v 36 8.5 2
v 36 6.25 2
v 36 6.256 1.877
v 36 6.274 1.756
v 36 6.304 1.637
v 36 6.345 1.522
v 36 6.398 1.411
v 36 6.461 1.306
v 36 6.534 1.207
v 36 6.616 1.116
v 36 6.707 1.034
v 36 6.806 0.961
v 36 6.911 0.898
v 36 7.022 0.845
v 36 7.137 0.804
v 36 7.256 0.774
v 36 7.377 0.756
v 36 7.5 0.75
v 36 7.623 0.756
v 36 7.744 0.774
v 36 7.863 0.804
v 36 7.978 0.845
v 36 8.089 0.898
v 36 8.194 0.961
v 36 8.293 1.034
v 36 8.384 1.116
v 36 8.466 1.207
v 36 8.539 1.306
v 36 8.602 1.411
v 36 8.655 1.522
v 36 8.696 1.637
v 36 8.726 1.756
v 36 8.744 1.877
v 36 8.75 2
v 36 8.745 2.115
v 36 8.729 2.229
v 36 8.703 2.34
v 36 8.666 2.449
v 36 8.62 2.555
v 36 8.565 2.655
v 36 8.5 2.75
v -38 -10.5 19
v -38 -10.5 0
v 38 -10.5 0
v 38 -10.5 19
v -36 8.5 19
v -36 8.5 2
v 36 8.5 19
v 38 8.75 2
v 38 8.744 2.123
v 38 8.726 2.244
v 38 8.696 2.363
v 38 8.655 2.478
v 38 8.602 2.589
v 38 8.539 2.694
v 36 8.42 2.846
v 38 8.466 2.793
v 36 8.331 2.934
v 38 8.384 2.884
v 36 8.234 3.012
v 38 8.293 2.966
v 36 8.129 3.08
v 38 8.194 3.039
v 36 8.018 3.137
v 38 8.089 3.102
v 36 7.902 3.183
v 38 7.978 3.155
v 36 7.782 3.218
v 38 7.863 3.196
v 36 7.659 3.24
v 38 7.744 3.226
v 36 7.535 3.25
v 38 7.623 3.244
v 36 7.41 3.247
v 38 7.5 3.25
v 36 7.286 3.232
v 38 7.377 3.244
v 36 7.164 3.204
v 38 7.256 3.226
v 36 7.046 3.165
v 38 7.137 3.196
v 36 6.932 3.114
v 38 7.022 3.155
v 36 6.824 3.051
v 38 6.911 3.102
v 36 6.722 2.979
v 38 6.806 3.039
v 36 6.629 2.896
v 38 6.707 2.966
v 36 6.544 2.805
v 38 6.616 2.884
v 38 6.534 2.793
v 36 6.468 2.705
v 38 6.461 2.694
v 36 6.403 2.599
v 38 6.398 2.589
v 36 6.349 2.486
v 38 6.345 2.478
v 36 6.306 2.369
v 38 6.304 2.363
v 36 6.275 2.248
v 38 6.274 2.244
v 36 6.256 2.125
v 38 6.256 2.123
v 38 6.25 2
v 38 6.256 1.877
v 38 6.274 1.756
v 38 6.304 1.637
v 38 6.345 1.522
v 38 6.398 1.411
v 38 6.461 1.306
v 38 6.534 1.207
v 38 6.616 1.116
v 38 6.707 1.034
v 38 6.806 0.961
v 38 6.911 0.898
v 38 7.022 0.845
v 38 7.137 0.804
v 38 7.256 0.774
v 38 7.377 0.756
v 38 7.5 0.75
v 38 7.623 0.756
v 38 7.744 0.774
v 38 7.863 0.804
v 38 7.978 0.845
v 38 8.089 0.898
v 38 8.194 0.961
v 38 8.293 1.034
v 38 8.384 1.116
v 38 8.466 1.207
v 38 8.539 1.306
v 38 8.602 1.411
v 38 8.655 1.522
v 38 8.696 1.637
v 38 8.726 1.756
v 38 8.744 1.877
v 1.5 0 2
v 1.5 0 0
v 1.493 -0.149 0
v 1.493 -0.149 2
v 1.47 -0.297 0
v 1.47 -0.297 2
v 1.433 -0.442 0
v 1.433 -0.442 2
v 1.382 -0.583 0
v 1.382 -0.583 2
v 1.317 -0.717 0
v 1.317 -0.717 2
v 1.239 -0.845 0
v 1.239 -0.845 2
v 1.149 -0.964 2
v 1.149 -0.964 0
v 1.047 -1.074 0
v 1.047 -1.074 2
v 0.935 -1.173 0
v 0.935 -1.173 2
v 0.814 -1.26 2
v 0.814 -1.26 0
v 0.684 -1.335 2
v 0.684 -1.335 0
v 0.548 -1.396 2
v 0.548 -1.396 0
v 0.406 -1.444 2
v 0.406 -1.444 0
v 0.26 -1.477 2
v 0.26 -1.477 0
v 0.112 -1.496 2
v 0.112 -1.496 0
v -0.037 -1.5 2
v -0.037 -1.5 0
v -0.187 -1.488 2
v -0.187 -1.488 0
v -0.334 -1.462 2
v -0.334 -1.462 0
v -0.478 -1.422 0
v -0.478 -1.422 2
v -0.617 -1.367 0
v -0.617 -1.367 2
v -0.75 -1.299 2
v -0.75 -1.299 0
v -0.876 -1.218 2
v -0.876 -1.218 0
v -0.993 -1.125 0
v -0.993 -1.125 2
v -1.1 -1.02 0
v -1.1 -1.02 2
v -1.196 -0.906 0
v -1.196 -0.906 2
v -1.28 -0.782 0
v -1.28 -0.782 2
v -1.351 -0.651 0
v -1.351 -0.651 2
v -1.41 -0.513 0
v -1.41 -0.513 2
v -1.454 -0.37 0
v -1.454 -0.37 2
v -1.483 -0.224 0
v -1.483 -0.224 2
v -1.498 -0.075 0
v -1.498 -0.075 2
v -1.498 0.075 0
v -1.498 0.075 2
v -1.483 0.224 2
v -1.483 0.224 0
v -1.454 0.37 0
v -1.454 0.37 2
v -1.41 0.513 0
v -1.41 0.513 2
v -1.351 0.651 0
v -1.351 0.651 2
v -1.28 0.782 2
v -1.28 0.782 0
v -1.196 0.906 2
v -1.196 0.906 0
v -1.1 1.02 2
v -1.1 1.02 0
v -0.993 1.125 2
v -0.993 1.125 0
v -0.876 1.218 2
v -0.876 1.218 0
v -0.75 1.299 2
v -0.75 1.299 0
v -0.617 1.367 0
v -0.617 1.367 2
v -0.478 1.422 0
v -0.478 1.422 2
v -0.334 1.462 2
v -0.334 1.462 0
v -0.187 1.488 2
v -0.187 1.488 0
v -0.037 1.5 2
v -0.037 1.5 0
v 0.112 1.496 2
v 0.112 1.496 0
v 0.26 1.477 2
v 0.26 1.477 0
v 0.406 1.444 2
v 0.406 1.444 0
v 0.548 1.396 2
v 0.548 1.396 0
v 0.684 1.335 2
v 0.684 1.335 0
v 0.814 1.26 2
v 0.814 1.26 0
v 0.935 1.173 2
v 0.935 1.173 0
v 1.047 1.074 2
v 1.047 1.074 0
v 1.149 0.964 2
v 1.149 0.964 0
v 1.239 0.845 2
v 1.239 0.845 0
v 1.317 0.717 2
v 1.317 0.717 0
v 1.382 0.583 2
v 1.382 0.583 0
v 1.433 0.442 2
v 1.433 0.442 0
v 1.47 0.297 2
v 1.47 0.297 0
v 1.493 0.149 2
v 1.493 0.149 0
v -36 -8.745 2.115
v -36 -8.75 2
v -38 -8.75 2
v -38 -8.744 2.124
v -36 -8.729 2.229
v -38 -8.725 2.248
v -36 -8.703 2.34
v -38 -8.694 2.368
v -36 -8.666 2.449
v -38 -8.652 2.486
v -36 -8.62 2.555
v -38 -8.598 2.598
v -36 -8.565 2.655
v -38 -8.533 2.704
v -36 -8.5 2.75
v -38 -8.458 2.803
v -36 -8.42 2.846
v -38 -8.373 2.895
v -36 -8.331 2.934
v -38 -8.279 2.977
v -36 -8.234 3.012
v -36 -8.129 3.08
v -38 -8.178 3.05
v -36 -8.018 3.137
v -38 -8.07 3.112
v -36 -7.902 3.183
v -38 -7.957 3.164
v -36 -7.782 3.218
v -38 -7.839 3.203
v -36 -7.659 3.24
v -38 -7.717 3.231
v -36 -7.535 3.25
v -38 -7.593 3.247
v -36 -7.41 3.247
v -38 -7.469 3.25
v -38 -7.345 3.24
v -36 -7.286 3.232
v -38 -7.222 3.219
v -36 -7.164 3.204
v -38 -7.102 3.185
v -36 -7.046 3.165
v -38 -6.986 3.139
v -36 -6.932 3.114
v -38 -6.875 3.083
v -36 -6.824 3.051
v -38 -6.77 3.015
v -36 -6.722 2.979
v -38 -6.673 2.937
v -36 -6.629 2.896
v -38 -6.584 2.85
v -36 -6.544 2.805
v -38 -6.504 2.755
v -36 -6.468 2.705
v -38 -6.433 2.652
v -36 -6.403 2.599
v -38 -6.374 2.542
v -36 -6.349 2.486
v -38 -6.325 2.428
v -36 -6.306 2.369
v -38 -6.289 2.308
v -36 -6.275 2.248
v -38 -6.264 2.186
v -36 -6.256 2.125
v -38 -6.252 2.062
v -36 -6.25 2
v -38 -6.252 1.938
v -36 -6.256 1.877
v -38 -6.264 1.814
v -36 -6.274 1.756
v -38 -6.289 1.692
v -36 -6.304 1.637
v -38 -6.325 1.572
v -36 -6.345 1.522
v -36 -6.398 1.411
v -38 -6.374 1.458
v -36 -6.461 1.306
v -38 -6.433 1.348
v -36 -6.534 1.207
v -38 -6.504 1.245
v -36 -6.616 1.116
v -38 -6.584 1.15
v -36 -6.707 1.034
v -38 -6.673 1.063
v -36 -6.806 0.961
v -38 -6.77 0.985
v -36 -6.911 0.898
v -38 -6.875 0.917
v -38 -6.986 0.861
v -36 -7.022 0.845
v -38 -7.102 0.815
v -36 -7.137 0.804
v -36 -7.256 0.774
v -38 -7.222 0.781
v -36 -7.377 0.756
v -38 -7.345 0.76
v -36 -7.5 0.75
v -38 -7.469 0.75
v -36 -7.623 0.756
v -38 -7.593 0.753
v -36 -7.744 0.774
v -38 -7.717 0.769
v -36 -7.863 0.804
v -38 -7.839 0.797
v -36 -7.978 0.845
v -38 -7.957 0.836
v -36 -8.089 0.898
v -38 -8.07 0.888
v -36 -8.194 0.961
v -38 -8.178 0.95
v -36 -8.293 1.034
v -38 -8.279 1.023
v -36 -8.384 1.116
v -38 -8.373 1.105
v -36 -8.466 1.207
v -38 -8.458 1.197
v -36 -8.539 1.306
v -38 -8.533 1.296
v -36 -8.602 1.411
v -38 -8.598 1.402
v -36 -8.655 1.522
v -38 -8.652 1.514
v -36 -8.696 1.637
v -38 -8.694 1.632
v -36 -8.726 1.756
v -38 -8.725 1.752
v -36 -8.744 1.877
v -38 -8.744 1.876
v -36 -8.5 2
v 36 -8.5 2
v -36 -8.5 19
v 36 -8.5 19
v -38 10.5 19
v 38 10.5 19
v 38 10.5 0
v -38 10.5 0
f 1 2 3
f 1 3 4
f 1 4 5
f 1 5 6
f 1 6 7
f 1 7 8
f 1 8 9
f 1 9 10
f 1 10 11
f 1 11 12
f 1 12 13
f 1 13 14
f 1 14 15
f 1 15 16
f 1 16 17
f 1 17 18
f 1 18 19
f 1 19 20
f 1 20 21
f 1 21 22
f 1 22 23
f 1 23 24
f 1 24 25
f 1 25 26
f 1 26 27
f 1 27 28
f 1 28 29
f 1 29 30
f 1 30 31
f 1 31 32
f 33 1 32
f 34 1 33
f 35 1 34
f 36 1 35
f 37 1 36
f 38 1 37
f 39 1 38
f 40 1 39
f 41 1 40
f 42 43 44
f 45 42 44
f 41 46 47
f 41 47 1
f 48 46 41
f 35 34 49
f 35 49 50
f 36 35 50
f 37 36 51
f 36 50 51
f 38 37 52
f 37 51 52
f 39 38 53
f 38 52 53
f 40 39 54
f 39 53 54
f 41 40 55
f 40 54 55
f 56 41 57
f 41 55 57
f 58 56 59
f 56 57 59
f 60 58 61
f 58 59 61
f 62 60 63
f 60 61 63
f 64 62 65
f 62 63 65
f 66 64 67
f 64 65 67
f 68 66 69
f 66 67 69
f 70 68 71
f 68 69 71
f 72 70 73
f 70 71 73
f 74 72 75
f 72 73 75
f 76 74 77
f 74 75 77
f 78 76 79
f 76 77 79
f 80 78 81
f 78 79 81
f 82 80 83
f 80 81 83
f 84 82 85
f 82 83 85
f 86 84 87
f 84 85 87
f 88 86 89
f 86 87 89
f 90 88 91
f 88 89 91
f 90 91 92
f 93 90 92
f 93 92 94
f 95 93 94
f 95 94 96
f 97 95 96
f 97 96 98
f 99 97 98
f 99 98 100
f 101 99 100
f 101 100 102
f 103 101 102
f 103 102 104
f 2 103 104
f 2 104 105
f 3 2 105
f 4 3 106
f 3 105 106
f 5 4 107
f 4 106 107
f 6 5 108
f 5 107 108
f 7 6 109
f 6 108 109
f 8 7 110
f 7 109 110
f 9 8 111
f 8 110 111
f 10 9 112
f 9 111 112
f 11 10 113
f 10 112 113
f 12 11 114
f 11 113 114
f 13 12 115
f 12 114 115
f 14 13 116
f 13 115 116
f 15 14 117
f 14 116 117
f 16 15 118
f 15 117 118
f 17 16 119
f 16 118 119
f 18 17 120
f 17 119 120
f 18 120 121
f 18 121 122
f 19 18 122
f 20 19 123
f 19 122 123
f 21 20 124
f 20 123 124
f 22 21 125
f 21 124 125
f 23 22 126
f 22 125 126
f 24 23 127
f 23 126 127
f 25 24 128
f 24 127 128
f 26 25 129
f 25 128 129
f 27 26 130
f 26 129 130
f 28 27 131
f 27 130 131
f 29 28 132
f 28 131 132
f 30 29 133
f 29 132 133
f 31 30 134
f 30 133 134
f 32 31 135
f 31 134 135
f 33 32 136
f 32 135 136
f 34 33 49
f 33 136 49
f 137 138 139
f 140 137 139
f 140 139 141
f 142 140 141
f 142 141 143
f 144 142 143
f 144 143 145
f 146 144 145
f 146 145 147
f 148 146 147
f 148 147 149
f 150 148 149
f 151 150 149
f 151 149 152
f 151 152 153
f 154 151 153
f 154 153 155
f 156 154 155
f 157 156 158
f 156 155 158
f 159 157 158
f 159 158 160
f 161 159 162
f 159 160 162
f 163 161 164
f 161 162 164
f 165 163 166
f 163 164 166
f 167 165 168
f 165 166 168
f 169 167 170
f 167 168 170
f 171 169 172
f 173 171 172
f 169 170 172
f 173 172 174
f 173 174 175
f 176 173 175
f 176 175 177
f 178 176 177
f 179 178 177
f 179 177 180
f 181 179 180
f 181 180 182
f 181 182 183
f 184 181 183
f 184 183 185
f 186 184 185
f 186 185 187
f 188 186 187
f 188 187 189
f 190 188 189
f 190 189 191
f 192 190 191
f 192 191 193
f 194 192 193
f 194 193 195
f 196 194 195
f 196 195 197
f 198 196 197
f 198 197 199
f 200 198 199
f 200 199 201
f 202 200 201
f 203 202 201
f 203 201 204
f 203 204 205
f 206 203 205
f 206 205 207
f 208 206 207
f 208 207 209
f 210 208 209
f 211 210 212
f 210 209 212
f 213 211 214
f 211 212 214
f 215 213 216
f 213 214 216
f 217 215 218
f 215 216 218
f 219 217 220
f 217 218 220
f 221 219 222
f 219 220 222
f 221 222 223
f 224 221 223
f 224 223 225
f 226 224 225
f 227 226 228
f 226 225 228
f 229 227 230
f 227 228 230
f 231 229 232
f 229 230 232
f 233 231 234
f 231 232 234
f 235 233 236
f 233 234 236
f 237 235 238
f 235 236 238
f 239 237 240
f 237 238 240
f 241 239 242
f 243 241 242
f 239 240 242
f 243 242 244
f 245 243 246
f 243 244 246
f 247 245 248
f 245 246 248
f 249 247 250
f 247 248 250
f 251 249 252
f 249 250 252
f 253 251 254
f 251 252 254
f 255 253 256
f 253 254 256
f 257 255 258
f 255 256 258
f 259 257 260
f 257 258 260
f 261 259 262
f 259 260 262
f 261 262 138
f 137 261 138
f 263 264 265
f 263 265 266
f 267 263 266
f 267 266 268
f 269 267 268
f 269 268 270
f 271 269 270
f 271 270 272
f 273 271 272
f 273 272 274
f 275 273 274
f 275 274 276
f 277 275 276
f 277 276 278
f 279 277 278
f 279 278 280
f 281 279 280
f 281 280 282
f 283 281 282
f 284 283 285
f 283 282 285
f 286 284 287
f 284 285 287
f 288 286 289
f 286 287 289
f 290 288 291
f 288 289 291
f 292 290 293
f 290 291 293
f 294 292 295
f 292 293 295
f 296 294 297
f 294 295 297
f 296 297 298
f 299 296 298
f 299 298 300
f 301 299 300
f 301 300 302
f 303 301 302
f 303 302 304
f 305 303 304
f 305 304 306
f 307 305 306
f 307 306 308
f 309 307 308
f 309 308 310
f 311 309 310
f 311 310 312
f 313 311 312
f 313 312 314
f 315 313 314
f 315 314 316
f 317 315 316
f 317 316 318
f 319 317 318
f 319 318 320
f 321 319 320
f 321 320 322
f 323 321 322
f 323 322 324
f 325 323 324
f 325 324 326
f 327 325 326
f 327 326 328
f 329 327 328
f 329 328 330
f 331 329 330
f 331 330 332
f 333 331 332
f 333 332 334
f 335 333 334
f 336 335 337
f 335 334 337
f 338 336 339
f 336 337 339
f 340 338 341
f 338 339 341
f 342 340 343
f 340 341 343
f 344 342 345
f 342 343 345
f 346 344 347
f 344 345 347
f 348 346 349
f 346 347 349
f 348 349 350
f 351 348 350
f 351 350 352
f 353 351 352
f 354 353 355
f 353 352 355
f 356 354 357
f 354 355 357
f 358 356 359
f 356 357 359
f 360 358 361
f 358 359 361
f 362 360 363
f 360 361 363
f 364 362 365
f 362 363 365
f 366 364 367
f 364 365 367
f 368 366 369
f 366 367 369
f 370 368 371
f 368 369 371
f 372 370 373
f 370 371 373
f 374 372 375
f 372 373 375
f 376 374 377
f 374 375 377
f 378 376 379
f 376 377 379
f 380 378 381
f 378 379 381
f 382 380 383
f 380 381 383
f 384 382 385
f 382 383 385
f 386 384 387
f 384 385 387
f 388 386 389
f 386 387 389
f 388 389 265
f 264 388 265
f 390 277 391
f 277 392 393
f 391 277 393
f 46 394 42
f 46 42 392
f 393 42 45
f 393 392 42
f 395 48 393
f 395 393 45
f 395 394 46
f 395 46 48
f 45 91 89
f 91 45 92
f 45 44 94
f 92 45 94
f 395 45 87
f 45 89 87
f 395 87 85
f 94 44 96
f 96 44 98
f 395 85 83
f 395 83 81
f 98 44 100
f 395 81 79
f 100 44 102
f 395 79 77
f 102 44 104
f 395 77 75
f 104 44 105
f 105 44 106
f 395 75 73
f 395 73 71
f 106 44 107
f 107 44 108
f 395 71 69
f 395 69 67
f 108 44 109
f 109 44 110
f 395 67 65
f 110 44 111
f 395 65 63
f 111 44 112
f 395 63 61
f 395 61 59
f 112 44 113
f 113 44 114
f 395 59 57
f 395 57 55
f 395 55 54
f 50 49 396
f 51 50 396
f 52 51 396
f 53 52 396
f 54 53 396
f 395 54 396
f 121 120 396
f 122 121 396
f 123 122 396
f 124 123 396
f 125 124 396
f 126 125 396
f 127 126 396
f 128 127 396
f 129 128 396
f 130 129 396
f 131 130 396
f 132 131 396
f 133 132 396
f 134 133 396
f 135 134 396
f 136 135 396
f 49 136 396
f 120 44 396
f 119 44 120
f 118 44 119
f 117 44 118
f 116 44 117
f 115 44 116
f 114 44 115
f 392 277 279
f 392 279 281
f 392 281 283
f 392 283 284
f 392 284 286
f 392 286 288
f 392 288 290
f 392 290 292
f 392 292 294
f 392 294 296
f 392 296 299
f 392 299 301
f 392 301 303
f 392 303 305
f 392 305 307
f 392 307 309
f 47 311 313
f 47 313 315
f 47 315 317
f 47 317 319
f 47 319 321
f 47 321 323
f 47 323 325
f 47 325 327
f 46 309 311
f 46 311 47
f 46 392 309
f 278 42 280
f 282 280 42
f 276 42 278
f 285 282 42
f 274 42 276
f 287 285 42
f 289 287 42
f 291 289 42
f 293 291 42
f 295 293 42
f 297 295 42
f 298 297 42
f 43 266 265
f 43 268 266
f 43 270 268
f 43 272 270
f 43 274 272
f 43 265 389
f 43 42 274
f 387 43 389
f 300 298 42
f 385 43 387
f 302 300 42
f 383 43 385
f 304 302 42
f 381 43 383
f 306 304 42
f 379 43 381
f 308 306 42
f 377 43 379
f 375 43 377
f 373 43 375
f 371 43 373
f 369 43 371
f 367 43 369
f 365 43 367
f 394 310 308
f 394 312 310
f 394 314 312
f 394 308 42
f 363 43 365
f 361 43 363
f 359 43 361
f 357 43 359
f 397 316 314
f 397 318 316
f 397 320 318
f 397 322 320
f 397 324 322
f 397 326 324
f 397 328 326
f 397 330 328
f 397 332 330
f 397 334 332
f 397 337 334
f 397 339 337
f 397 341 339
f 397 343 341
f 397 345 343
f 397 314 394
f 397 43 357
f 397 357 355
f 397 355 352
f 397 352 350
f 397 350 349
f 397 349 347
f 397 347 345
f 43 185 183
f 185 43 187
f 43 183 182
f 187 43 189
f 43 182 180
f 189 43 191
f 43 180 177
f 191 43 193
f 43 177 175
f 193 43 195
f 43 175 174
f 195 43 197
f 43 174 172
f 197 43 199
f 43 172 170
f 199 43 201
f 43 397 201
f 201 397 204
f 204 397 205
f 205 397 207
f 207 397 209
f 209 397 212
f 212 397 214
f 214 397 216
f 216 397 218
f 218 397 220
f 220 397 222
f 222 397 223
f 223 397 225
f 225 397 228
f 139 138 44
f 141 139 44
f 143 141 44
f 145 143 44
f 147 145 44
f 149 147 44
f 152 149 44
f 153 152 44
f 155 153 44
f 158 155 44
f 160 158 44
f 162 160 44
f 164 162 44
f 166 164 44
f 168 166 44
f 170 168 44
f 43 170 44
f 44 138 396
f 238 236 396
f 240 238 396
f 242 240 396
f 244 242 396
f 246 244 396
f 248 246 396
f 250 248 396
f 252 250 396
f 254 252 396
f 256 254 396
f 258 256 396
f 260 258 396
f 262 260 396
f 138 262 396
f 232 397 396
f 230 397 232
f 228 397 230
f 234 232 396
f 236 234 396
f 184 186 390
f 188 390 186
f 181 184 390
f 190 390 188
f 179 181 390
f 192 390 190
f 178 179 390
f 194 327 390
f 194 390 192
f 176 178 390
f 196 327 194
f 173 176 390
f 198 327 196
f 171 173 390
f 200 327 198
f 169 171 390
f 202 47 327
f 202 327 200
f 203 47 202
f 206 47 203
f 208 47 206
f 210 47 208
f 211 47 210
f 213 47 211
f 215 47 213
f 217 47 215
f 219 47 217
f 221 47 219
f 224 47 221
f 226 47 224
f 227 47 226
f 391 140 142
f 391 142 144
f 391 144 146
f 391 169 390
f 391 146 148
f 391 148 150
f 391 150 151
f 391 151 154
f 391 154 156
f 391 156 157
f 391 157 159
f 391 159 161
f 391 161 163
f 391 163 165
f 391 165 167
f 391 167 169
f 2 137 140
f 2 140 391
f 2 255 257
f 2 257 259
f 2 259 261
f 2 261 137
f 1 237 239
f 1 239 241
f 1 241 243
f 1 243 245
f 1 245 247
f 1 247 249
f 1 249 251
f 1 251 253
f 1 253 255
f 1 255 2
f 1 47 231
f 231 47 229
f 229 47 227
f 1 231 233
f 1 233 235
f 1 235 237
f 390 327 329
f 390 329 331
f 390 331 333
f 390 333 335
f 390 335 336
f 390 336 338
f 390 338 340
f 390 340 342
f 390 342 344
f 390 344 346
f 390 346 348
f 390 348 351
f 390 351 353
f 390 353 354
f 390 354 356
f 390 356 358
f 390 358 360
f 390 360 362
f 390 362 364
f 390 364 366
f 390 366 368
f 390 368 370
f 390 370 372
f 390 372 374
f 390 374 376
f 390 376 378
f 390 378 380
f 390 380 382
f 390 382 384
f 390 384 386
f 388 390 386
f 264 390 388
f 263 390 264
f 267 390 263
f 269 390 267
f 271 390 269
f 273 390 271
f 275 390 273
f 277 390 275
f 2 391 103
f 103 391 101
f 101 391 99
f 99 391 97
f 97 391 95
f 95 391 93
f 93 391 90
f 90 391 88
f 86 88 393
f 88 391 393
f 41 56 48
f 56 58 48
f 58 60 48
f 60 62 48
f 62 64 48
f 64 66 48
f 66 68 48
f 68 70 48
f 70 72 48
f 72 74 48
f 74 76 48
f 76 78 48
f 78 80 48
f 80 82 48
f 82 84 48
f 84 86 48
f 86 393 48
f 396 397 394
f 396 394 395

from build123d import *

# Parameters (mm, degrees)
F0_W     = 76
F0_H     = 21
F1_DEPTH = 19
F2_W     = 72
F2_H     = 17
F3_DEPTH = 17
F4_R     = 1.5
F5_DEPTH = 19.001
F6_R     = 1.25
F7_DEPTH = 2
F9_DEPTH = 2


with BuildPart() as f1:
    # F0 (on Top) → F1 (new body)
    with BuildSketch(Plane.XY):
        Rectangle(F0_W, F0_H)
    extrude(amount=F1_DEPTH)

    # F2 (on face) → F3 (cut)
    with BuildSketch(Plane.XY.offset(19)):
        Rectangle(F2_W, F2_H)
    extrude(amount=-F3_DEPTH, mode=Mode.SUBTRACT)

    # F4 (on face) → F5 (cut, through all)
    with BuildSketch(Plane(origin=(0, 0, 0), x_dir=(1, 0, 0), z_dir=(0, 0, -1))):
        Circle(F4_R)
    extrude(amount=-F5_DEPTH, mode=Mode.SUBTRACT)

    # F6 (on face) → F7 (cut)
    with BuildSketch(Plane(origin=(-38, 0, 0), x_dir=(0, -1, 0), z_dir=(-1, 0, 0))):
        with Locations((7.5, 2)):
            Circle(F6_R)
    extrude(amount=-F7_DEPTH, mode=Mode.SUBTRACT)

    # F8 (on face) → F9 (cut)
    with BuildSketch(Plane.YZ.offset(38)):
        with BuildLine():
            ThreePointArc((7.5, 0.75), (8.383883, 1.116117), (8.75, 2))
            Line((8.75, 2), (7.5, 2))
            Line((7.5, 2), (7.5, 0.75))
        make_face()
        with BuildLine():
            Line((7.5, 2), (8.75, 2))
            ThreePointArc((8.75, 2), (6.616117, 2.883883), (7.5, 0.75))
            Line((7.5, 0.75), (7.5, 2))
        make_face()
    extrude(amount=-F9_DEPTH, mode=Mode.SUBTRACT)


solid = f1.part
